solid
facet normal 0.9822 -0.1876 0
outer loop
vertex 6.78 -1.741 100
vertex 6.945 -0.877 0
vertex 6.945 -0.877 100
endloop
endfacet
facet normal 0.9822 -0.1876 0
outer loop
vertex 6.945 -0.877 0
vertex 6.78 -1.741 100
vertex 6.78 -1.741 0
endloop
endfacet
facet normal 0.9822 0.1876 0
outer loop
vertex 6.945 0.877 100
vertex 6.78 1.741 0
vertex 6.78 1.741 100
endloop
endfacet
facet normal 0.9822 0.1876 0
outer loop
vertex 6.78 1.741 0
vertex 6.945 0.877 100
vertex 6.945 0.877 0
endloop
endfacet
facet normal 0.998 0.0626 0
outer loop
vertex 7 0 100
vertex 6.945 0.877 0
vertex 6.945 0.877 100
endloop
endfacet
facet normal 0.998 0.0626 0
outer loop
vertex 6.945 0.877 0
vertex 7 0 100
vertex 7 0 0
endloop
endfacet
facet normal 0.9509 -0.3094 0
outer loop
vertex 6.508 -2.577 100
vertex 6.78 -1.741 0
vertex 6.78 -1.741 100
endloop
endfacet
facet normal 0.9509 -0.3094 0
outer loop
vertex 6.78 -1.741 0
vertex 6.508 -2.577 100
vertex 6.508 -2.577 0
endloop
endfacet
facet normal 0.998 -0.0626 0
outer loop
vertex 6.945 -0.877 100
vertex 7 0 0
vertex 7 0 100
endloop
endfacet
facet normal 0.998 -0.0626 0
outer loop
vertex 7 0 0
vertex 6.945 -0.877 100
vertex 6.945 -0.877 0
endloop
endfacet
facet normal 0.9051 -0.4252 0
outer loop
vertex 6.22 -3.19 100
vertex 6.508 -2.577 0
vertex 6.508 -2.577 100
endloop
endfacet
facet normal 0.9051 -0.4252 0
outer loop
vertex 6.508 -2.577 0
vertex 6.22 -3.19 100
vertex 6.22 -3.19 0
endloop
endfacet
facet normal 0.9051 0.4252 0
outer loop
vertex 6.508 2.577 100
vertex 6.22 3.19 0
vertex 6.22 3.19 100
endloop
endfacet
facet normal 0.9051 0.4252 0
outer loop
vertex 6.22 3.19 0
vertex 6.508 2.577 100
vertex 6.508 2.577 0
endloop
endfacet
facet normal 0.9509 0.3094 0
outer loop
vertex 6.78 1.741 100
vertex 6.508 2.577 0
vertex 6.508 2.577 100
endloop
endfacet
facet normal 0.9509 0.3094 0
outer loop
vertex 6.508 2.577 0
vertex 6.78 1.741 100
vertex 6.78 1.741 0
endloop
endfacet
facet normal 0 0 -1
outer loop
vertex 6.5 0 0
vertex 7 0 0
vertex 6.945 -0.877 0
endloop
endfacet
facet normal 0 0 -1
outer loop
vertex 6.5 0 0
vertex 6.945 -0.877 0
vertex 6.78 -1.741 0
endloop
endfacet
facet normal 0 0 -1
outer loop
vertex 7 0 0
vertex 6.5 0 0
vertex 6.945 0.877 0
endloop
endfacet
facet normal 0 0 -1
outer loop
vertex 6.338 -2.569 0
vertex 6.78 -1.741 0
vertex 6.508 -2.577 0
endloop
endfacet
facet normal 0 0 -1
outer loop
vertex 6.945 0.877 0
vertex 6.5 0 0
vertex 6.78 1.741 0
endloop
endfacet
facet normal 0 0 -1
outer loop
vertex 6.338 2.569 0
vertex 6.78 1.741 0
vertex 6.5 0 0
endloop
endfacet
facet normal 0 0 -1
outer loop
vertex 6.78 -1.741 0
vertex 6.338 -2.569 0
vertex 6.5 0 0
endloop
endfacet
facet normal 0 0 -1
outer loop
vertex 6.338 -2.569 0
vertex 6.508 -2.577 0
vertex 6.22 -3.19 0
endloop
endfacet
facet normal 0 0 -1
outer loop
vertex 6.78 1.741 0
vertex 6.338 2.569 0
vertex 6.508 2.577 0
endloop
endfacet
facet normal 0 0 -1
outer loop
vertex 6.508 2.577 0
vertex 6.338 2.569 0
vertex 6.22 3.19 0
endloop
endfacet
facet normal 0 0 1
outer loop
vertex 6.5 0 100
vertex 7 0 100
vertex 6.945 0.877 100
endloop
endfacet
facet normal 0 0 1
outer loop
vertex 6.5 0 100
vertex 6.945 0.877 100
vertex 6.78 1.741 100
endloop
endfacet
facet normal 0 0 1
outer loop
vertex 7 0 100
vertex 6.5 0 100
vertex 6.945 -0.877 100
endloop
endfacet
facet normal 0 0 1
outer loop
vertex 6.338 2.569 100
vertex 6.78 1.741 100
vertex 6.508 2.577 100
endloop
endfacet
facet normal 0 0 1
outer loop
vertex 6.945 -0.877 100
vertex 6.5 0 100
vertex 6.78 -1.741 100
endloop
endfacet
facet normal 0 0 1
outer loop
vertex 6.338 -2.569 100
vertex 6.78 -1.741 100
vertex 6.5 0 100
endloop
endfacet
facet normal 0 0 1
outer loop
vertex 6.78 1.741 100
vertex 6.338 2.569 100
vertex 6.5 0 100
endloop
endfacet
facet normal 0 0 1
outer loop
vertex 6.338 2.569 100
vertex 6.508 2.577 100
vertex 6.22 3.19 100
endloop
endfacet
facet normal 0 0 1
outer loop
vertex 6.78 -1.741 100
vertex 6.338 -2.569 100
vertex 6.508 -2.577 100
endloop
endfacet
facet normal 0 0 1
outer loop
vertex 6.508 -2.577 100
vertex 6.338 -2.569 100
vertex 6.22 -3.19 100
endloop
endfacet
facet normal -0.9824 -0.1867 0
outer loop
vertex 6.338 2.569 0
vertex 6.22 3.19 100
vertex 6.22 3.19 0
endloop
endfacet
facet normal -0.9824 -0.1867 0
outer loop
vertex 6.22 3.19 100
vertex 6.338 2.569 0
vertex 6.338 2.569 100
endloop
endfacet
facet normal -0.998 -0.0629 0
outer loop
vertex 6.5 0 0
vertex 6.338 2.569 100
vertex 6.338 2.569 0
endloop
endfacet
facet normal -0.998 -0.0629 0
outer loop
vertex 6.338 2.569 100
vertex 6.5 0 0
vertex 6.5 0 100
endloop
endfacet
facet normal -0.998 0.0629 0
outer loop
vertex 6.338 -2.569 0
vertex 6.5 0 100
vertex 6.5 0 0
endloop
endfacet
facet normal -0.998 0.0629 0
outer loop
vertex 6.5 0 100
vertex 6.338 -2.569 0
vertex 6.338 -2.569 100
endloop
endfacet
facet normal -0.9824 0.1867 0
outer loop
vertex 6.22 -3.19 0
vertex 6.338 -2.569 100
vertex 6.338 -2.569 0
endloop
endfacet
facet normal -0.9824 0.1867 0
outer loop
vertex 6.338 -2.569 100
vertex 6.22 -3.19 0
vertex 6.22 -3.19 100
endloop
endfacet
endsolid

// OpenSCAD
$fn = 50;


difference() {
	union() {
		cylinder(h = 100, r = 7.0000000000);
		translate(v = [-17.0000000000, 0, 0]) {
			cylinder(h = 100, r = 7.0000000000);
		}
	}
	union() {
		cylinder(h = 100, r = 3.2500000000);
		cylinder(h = 100, r = 1.8000000000);
		cylinder(h = 100, r = 1.8000000000);
		cylinder(h = 100, r = 1.8000000000);
		translate(v = [-21.5000000000, 0, 0]) {
			hull() {
				translate(v = [-3.7500000000, 0.0000000000, 0]) {
					cylinder(h = 100, r = 10.5000000000);
				}
				translate(v = [3.7500000000, 0.0000000000, 0]) {
					cylinder(h = 100, r = 10.5000000000);
				}
				translate(v = [-3.7500000000, -0.0000000000, 0]) {
					cylinder(h = 100, r = 10.5000000000);
				}
				translate(v = [3.7500000000, -0.0000000000, 0]) {
					cylinder(h = 100, r = 10.5000000000);
				}
			}
		}
		translate(v = [-14.0000000000, 0, 0.0000000000]) {
			cylinder(h = 100, r = 20.5000000000);
		}
	}
}
